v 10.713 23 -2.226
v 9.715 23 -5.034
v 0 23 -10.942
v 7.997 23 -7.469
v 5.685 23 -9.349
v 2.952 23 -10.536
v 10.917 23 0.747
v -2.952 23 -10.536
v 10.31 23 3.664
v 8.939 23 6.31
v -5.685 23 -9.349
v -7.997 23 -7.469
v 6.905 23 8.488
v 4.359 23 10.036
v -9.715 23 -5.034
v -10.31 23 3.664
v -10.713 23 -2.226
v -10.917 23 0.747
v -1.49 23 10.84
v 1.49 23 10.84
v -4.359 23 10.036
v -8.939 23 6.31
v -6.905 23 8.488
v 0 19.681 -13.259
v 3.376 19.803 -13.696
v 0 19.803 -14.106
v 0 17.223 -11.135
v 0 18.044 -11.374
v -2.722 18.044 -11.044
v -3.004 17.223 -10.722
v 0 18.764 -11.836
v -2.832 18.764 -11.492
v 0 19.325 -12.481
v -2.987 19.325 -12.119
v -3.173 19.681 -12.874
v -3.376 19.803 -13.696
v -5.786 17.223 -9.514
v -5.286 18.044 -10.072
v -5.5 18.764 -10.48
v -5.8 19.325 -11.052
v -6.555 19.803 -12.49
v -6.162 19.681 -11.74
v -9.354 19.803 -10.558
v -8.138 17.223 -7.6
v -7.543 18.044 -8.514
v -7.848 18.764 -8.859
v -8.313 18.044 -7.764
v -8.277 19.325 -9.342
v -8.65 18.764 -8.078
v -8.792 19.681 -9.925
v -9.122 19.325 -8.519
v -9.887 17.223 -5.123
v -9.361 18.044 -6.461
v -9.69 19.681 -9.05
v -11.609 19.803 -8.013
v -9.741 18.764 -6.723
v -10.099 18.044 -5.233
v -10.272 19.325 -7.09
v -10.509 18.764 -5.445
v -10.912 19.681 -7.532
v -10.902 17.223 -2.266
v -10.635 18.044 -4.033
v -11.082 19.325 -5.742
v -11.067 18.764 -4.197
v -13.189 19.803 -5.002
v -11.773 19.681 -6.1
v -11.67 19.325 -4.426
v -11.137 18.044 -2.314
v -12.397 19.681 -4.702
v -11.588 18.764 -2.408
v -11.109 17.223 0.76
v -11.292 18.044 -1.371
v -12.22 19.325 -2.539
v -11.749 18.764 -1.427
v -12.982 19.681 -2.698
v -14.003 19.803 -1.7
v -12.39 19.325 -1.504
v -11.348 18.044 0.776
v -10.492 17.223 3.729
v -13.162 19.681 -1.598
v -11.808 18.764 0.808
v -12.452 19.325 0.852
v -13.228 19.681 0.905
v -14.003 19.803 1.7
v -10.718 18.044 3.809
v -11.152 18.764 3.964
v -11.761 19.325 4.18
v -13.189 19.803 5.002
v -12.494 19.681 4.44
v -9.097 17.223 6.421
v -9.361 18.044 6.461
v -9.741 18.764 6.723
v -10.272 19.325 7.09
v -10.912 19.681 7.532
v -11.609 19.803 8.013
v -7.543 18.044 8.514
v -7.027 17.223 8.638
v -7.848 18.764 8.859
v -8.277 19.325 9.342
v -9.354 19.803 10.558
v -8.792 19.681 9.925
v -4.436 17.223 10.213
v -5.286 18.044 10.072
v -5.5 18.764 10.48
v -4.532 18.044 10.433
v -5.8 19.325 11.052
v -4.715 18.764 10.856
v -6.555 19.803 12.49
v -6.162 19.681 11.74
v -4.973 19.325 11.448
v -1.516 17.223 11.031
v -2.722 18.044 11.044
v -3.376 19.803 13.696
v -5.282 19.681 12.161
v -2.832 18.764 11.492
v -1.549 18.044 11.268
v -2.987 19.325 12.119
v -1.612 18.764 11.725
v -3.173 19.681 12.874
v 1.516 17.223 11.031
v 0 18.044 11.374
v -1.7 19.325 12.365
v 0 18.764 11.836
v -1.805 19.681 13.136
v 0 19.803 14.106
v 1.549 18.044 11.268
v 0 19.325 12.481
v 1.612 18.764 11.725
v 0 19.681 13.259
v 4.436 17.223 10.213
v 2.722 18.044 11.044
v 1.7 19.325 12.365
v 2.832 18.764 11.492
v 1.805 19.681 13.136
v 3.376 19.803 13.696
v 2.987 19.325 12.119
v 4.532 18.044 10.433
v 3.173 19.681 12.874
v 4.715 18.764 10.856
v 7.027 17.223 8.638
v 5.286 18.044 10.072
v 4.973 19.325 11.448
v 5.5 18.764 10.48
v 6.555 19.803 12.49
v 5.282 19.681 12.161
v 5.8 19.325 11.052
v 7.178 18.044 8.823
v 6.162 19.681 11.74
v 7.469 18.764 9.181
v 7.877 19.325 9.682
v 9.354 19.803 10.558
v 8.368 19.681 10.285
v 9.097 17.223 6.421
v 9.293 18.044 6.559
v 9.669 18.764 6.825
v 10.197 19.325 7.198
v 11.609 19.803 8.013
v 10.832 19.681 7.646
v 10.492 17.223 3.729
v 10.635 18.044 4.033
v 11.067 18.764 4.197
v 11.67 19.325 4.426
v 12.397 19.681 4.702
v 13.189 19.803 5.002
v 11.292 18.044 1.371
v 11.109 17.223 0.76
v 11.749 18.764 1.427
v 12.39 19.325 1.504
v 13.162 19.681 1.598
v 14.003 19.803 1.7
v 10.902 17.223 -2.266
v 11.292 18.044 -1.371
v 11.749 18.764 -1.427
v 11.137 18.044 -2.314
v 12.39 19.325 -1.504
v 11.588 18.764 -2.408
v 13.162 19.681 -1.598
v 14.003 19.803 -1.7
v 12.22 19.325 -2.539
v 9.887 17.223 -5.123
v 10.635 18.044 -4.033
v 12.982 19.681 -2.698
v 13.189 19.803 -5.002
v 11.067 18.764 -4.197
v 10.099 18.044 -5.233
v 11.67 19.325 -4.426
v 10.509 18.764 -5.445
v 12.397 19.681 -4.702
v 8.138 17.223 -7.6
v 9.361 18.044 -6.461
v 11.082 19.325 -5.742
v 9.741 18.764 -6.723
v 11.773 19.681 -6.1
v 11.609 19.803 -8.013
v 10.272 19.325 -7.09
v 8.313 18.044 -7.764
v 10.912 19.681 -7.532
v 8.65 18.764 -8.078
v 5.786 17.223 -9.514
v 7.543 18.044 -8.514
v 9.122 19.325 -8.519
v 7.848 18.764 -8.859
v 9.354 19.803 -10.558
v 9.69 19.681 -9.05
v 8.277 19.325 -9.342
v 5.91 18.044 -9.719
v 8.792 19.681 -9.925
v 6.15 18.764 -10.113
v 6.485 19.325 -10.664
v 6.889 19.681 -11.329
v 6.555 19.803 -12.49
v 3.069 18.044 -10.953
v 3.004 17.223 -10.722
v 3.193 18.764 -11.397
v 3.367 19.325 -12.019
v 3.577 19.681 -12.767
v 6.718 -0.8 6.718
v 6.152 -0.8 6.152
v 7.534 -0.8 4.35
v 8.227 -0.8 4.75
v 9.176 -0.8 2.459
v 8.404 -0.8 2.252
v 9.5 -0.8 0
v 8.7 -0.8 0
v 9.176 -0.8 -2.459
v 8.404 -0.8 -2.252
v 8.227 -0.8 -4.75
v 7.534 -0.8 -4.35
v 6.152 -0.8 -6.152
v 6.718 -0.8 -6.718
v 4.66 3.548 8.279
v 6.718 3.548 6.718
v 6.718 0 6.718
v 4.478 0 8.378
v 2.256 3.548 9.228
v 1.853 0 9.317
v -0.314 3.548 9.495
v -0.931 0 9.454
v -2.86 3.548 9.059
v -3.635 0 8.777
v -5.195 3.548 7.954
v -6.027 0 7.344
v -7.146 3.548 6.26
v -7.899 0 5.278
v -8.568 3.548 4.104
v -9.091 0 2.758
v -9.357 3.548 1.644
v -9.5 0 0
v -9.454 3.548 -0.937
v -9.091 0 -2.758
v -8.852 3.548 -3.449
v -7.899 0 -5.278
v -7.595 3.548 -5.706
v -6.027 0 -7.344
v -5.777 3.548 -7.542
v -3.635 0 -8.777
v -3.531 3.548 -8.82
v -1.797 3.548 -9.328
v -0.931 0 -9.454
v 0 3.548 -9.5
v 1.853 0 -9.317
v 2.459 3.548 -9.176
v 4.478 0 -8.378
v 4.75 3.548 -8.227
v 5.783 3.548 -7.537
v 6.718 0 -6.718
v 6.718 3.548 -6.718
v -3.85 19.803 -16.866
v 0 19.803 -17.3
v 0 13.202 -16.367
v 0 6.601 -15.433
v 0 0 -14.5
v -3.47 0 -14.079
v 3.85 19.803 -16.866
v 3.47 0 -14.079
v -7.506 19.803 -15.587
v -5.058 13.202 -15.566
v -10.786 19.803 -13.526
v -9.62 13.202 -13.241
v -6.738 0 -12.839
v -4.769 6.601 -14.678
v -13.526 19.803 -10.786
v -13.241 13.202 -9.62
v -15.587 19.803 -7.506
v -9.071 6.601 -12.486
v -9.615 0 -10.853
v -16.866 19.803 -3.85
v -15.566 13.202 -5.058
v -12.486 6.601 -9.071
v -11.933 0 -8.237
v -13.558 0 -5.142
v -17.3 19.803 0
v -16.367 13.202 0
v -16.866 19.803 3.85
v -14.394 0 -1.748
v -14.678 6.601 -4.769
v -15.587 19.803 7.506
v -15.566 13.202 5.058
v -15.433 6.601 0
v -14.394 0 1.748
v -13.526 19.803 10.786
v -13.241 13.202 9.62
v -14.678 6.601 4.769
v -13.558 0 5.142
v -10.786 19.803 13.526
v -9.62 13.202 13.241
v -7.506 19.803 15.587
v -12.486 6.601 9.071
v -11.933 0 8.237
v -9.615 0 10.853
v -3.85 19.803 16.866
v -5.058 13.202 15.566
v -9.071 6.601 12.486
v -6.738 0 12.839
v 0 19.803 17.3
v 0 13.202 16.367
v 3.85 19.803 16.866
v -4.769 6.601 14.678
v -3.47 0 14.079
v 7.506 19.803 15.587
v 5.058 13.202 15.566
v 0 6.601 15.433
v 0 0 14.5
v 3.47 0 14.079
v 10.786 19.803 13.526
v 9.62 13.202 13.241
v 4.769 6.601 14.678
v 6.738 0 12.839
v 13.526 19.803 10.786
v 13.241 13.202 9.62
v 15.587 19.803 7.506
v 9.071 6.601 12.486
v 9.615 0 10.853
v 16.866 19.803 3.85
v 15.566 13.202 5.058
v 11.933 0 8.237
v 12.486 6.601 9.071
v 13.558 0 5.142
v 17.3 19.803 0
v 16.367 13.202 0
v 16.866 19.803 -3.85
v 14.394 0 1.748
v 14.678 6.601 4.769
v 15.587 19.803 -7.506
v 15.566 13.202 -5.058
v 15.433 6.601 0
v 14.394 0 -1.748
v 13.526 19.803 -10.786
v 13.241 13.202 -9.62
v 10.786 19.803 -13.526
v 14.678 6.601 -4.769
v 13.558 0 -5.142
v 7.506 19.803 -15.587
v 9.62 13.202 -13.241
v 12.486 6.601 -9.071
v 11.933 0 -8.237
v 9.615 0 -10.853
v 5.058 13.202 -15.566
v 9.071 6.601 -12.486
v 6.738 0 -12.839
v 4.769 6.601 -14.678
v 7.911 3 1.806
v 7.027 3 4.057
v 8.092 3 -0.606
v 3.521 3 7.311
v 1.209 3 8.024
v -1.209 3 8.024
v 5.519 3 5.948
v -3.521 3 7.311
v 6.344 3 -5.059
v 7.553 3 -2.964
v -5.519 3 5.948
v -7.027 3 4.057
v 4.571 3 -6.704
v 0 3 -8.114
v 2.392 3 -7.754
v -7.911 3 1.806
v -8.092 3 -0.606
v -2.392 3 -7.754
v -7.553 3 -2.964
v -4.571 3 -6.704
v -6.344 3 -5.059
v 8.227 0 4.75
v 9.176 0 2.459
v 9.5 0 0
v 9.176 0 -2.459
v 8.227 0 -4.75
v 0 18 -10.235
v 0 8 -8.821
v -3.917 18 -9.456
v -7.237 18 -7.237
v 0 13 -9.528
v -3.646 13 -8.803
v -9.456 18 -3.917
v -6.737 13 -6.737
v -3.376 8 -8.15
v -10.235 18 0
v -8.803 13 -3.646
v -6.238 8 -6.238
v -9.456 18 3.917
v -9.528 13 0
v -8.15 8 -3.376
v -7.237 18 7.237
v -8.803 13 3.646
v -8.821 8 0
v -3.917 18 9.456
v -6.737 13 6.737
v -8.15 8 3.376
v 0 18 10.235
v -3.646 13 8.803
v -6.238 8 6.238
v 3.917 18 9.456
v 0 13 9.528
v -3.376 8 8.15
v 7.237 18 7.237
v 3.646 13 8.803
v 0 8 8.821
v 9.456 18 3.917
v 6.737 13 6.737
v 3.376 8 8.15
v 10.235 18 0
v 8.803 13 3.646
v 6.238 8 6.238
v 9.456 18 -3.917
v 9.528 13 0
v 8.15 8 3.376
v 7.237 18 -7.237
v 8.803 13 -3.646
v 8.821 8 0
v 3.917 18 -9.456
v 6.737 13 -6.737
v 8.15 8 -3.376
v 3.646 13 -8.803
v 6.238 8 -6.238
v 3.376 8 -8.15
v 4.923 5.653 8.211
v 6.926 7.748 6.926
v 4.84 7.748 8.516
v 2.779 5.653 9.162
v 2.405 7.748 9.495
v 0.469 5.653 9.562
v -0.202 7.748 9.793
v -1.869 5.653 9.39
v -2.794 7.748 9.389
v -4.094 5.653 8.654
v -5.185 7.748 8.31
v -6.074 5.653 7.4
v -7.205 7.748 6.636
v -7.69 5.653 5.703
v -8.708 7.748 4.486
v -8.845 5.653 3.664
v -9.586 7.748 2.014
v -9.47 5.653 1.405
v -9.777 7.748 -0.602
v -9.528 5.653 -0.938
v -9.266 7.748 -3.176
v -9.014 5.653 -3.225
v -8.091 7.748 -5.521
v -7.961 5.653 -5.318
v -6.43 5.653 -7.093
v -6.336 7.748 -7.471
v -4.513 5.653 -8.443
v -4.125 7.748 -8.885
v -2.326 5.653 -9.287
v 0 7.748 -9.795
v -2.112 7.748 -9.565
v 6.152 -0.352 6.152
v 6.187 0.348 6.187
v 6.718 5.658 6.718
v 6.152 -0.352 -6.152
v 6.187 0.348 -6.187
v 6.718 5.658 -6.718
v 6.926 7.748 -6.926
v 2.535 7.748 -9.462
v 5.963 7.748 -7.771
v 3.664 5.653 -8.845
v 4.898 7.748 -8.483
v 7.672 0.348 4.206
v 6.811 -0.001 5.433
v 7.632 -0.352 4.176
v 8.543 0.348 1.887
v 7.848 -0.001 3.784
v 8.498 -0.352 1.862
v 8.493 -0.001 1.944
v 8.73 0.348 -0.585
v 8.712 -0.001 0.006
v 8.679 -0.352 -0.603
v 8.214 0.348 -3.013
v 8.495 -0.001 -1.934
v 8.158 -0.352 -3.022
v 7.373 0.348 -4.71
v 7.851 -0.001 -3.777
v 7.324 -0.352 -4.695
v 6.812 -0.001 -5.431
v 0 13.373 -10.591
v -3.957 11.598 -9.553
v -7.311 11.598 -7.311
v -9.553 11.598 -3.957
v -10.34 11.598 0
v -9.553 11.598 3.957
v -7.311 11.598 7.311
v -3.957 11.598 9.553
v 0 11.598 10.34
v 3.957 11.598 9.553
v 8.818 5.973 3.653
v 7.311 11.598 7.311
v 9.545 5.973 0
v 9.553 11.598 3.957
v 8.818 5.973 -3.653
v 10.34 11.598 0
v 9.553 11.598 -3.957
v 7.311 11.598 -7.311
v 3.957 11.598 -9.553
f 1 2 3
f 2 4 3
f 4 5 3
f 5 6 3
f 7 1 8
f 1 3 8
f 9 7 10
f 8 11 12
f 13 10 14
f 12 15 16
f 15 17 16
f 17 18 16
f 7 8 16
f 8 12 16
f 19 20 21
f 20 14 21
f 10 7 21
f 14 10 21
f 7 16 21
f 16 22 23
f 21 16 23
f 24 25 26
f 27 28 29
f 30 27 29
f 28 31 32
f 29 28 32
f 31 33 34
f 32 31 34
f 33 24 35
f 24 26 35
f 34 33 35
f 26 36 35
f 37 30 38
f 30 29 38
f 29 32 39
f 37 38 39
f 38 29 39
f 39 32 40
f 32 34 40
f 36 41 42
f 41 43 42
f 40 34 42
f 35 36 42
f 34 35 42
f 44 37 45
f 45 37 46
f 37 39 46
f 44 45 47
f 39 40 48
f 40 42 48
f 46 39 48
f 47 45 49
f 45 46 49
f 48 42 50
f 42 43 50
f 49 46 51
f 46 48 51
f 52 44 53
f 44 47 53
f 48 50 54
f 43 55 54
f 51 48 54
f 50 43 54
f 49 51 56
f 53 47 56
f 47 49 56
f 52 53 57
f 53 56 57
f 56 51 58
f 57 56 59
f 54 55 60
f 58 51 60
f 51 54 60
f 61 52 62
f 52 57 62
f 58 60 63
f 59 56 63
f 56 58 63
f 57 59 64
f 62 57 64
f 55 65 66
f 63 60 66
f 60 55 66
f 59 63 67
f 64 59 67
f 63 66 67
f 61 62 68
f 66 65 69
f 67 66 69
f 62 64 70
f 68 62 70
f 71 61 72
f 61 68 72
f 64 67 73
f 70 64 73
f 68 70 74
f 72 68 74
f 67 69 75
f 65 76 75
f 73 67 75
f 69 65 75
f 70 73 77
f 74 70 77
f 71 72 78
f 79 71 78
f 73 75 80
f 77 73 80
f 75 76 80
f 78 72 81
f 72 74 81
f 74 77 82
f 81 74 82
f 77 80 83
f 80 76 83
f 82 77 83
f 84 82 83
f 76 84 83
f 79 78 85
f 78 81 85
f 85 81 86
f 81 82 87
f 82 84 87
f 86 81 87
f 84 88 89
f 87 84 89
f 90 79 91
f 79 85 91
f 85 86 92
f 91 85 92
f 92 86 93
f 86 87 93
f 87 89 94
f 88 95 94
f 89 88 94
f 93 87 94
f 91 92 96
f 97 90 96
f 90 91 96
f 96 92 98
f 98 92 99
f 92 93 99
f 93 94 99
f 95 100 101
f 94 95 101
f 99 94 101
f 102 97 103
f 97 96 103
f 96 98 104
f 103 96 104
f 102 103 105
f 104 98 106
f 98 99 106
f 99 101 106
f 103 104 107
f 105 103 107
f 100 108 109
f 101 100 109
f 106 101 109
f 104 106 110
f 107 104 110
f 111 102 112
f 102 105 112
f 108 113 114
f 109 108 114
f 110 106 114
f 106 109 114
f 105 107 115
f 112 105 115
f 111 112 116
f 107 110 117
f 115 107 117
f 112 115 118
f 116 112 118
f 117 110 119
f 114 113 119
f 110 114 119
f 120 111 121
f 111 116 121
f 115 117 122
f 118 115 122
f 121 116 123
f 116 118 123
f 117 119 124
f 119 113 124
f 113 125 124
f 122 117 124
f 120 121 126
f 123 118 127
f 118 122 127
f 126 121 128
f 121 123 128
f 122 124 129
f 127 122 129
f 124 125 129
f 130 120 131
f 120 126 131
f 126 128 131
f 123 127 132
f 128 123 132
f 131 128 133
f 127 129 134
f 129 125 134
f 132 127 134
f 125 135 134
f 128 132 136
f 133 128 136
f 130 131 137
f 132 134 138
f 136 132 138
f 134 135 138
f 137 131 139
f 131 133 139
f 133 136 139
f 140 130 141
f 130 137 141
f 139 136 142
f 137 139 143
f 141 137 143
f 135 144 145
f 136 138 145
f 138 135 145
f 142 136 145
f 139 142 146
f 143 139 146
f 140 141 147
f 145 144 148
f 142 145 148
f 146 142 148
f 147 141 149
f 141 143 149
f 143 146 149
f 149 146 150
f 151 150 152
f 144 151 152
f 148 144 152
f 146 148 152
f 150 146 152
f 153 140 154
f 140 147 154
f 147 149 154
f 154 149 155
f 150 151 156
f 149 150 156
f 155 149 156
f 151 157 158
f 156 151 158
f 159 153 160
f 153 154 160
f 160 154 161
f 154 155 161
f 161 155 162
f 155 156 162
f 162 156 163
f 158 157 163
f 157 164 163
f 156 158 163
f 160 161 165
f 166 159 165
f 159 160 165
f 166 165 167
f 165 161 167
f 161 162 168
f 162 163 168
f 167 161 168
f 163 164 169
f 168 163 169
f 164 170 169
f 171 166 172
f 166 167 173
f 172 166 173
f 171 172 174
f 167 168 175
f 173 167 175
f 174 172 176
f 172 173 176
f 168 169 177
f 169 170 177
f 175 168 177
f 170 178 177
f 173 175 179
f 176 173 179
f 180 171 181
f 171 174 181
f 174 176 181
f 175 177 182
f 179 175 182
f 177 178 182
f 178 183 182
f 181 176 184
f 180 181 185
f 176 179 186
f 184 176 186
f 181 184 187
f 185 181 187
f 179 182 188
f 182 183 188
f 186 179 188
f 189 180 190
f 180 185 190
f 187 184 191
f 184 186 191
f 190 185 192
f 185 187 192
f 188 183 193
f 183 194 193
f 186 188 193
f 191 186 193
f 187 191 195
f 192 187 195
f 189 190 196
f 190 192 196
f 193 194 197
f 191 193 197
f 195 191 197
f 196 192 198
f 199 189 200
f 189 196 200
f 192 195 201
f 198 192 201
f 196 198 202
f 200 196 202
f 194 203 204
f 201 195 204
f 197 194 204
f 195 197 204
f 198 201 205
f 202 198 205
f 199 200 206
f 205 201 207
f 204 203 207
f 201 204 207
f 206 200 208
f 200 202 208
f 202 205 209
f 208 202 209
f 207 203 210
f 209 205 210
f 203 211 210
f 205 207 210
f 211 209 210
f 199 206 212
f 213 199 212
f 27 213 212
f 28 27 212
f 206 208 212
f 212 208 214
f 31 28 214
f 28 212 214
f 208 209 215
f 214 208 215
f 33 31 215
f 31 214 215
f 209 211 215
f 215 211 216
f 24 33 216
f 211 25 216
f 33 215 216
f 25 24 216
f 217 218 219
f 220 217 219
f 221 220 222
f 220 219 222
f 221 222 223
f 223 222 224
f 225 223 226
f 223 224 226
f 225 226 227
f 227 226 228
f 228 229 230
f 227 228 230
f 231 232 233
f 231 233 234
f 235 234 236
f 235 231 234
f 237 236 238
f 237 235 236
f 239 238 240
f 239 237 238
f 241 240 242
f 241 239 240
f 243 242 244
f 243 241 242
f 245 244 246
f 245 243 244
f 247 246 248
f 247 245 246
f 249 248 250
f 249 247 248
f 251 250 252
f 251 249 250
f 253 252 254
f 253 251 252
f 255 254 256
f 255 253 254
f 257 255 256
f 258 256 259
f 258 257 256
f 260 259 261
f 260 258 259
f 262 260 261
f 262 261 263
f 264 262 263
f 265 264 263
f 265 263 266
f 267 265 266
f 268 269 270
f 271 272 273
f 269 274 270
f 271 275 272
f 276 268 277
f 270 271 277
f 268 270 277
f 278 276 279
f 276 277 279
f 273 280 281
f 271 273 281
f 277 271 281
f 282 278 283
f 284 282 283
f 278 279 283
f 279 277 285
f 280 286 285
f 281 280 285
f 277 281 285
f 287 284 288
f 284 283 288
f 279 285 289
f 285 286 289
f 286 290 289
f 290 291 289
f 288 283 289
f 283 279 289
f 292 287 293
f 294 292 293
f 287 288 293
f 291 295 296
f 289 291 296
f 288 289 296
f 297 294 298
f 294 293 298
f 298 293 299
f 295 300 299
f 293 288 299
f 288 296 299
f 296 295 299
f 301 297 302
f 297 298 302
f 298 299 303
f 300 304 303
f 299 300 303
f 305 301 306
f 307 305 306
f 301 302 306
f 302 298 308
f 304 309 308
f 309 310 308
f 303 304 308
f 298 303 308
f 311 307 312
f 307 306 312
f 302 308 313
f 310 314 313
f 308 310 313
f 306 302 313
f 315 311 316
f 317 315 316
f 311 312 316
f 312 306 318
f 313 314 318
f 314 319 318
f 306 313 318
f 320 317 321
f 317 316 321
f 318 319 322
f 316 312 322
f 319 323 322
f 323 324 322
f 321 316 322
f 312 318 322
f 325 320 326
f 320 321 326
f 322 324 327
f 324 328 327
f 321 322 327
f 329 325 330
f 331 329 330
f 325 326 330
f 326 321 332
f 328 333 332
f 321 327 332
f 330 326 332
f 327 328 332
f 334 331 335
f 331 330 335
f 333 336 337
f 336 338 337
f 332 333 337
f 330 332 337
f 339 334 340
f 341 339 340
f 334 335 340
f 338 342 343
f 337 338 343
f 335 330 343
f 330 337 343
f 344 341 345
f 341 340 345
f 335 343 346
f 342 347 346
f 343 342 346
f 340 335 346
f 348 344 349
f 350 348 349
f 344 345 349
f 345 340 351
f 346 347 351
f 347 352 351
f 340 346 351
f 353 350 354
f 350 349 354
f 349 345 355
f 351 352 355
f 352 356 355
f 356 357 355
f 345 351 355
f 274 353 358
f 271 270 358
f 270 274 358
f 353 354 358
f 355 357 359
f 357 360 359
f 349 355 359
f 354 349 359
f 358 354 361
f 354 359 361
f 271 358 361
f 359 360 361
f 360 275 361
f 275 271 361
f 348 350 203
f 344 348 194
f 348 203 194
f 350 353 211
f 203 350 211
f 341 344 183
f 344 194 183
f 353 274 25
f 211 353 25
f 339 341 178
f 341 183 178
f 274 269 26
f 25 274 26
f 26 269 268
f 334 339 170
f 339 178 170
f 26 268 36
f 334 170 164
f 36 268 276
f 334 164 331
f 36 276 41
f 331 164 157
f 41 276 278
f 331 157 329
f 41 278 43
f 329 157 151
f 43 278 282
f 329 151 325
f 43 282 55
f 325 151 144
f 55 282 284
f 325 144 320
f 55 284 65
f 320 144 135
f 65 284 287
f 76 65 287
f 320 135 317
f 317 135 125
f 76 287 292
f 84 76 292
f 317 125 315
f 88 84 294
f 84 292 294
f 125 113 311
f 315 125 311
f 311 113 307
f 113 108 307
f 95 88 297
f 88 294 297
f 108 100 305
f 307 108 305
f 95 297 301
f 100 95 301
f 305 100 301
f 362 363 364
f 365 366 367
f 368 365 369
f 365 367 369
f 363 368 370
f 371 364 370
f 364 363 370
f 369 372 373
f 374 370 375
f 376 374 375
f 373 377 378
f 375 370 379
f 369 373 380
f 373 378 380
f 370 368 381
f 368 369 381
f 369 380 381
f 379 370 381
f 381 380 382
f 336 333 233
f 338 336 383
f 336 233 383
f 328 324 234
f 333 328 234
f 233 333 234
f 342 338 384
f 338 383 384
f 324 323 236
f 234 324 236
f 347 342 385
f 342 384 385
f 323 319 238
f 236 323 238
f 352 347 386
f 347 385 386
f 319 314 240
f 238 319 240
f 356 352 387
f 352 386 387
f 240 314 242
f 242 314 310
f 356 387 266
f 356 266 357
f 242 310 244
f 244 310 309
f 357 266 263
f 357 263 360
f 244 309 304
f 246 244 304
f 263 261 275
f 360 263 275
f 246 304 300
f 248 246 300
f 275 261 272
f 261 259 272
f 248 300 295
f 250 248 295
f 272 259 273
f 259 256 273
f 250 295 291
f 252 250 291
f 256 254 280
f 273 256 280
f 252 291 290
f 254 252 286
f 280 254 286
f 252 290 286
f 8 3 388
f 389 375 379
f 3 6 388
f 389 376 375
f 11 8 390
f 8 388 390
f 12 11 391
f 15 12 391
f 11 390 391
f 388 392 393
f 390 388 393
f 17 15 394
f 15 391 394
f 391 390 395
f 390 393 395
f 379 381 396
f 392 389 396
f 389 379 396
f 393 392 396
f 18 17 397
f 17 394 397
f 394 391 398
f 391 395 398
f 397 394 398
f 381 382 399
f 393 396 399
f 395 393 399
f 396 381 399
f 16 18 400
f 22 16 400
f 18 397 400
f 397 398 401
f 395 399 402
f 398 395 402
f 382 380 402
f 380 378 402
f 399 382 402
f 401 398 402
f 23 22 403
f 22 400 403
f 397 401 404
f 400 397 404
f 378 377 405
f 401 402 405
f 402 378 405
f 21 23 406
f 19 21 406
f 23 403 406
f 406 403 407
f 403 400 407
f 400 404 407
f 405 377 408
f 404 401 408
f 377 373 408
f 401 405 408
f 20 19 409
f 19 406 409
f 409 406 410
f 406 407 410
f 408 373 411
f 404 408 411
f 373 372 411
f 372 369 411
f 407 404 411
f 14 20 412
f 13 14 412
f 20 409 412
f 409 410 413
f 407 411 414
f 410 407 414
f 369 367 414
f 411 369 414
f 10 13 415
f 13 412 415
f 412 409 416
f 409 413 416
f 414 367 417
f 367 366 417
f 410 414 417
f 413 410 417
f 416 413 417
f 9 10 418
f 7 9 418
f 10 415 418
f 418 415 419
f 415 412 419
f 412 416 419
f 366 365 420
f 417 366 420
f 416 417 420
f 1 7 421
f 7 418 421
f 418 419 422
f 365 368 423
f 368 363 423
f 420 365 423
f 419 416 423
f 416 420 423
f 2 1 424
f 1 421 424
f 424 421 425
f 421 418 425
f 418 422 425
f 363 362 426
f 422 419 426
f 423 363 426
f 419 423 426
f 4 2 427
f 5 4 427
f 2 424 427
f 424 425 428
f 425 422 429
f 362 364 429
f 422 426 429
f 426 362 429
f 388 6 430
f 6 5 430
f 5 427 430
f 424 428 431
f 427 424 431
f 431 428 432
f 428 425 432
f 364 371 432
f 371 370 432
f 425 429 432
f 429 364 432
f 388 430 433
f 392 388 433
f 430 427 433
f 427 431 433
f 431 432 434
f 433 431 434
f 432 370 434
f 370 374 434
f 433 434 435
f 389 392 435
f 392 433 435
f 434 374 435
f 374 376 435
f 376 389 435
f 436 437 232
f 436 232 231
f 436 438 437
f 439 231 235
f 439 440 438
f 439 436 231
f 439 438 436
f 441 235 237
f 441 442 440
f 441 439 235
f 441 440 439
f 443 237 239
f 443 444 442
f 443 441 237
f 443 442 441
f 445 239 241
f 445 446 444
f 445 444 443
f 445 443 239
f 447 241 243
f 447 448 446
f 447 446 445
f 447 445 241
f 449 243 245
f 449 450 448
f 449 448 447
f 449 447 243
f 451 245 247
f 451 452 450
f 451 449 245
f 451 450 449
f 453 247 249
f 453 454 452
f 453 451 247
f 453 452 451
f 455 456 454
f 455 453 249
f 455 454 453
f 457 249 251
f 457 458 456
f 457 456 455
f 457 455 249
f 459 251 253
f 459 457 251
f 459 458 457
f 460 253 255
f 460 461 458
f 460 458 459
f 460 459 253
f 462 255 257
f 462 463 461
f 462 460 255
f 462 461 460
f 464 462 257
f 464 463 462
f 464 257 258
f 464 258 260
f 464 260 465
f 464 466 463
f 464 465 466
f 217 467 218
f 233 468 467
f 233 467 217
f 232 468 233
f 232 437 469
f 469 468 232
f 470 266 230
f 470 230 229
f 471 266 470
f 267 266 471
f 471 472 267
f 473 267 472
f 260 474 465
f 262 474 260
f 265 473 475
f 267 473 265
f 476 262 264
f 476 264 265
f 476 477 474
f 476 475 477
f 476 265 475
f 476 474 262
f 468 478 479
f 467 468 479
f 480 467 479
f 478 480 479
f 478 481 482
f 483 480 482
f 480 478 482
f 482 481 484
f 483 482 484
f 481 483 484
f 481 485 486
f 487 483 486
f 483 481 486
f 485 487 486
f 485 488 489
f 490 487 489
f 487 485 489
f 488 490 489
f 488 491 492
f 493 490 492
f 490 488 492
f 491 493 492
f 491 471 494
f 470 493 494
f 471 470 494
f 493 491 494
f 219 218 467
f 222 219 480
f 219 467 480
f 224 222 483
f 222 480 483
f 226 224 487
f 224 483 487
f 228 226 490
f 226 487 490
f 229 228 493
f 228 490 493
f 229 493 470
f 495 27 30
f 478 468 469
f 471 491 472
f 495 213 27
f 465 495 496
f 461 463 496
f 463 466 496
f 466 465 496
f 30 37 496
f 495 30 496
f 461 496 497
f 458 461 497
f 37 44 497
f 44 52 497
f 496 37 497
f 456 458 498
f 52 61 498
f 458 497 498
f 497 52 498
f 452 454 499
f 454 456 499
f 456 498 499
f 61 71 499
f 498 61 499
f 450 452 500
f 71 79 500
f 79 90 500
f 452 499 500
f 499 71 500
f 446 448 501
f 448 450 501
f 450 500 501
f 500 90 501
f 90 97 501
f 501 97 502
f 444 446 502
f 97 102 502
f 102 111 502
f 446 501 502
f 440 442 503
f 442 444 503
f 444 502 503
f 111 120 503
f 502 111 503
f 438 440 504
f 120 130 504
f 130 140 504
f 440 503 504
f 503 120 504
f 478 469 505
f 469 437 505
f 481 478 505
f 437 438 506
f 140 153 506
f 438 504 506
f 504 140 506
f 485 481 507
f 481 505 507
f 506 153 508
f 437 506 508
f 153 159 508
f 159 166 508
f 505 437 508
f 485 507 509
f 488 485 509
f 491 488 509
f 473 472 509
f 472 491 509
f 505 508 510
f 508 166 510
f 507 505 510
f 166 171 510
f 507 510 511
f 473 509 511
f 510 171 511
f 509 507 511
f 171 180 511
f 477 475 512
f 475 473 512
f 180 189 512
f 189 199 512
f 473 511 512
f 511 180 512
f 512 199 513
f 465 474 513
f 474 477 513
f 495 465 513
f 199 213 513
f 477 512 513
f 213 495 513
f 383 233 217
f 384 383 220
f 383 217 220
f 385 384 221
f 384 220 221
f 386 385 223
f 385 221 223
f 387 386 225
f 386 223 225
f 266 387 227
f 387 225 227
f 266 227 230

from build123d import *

# Parameters (mm, degrees)
FILLET1_R          = 3
FILLET2_R          = 5
CUT_EXTRUDE1_START = -6.458008592
CUT_EXTRUDE1_DEPTH = 6.458008592
FILLET3_R          = 30


# Read off the part's stored shape, not the designer's step: Cut-Extrude1
with BuildPart() as part:
    # Sketch1 → Revolve1 (revolve)
    with BuildSketch(Plane.XY, mode=Mode.PRIVATE) as revolve1_sk:
        Polygon((8.7, 0), (11.5, 19.803030071), (17.3, 19.803030071), (14.5, 0), (9.5, 0), (9.5, -0.8), (8.7, -0.8), align=None)
        Polygon((0, 23), (10.942081128, 23), (8.114231057, 3), (0, 3), align=None)
    revolve(revolve1_sk.sketch.rotate(Axis((0, 0, 0), (0, 1, 0)), 90), axis=Axis((0, 0, 0), (0, 1, 0)))

    # Fillet1
    fillet1_edges = [part.edges().sort_by_distance(p)[0] for p in [
        (0, 19.803030071, 11.5),
    ]]
    fillet(fillet1_edges, radius=FILLET1_R)

    # Fillet2
    fillet2_edges = [part.edges().sort_by_distance(p)[0] for p in [
        (0, 0, 8.7),
    ]]
    fillet(fillet2_edges, radius=FILLET2_R)

    # Cut-Extrude1 outline → Cut-Extrude1 (cut)
    with BuildSketch(Plane.XZ.offset(0.8).offset(CUT_EXTRUDE1_START)):
        with BuildLine():
            ThreePointArc((6.717514421, 6.717514421), (-9.5, 0), (6.717514421, -6.717514421))
            Line((6.717514421, -6.717514421), (6.151828996, -6.151828996))
            ThreePointArc((6.151828996, -6.151828996), (-8.7, 0), (6.151828996, 6.151828996))
            Line((6.151828996, 6.151828996), (6.717514421, 6.717514421))
        make_face()
    extrude(amount=CUT_EXTRUDE1_DEPTH, mode=Mode.SUBTRACT)

    # Fillet3
    fillet3_edges = [part.edges().sort_by_distance(p)[0] for p in [
        (-8.776855559, 5.658008592, 3.635492607),
    ]]
    fillet(fillet3_edges, radius=FILLET3_R)


solid = part.part
